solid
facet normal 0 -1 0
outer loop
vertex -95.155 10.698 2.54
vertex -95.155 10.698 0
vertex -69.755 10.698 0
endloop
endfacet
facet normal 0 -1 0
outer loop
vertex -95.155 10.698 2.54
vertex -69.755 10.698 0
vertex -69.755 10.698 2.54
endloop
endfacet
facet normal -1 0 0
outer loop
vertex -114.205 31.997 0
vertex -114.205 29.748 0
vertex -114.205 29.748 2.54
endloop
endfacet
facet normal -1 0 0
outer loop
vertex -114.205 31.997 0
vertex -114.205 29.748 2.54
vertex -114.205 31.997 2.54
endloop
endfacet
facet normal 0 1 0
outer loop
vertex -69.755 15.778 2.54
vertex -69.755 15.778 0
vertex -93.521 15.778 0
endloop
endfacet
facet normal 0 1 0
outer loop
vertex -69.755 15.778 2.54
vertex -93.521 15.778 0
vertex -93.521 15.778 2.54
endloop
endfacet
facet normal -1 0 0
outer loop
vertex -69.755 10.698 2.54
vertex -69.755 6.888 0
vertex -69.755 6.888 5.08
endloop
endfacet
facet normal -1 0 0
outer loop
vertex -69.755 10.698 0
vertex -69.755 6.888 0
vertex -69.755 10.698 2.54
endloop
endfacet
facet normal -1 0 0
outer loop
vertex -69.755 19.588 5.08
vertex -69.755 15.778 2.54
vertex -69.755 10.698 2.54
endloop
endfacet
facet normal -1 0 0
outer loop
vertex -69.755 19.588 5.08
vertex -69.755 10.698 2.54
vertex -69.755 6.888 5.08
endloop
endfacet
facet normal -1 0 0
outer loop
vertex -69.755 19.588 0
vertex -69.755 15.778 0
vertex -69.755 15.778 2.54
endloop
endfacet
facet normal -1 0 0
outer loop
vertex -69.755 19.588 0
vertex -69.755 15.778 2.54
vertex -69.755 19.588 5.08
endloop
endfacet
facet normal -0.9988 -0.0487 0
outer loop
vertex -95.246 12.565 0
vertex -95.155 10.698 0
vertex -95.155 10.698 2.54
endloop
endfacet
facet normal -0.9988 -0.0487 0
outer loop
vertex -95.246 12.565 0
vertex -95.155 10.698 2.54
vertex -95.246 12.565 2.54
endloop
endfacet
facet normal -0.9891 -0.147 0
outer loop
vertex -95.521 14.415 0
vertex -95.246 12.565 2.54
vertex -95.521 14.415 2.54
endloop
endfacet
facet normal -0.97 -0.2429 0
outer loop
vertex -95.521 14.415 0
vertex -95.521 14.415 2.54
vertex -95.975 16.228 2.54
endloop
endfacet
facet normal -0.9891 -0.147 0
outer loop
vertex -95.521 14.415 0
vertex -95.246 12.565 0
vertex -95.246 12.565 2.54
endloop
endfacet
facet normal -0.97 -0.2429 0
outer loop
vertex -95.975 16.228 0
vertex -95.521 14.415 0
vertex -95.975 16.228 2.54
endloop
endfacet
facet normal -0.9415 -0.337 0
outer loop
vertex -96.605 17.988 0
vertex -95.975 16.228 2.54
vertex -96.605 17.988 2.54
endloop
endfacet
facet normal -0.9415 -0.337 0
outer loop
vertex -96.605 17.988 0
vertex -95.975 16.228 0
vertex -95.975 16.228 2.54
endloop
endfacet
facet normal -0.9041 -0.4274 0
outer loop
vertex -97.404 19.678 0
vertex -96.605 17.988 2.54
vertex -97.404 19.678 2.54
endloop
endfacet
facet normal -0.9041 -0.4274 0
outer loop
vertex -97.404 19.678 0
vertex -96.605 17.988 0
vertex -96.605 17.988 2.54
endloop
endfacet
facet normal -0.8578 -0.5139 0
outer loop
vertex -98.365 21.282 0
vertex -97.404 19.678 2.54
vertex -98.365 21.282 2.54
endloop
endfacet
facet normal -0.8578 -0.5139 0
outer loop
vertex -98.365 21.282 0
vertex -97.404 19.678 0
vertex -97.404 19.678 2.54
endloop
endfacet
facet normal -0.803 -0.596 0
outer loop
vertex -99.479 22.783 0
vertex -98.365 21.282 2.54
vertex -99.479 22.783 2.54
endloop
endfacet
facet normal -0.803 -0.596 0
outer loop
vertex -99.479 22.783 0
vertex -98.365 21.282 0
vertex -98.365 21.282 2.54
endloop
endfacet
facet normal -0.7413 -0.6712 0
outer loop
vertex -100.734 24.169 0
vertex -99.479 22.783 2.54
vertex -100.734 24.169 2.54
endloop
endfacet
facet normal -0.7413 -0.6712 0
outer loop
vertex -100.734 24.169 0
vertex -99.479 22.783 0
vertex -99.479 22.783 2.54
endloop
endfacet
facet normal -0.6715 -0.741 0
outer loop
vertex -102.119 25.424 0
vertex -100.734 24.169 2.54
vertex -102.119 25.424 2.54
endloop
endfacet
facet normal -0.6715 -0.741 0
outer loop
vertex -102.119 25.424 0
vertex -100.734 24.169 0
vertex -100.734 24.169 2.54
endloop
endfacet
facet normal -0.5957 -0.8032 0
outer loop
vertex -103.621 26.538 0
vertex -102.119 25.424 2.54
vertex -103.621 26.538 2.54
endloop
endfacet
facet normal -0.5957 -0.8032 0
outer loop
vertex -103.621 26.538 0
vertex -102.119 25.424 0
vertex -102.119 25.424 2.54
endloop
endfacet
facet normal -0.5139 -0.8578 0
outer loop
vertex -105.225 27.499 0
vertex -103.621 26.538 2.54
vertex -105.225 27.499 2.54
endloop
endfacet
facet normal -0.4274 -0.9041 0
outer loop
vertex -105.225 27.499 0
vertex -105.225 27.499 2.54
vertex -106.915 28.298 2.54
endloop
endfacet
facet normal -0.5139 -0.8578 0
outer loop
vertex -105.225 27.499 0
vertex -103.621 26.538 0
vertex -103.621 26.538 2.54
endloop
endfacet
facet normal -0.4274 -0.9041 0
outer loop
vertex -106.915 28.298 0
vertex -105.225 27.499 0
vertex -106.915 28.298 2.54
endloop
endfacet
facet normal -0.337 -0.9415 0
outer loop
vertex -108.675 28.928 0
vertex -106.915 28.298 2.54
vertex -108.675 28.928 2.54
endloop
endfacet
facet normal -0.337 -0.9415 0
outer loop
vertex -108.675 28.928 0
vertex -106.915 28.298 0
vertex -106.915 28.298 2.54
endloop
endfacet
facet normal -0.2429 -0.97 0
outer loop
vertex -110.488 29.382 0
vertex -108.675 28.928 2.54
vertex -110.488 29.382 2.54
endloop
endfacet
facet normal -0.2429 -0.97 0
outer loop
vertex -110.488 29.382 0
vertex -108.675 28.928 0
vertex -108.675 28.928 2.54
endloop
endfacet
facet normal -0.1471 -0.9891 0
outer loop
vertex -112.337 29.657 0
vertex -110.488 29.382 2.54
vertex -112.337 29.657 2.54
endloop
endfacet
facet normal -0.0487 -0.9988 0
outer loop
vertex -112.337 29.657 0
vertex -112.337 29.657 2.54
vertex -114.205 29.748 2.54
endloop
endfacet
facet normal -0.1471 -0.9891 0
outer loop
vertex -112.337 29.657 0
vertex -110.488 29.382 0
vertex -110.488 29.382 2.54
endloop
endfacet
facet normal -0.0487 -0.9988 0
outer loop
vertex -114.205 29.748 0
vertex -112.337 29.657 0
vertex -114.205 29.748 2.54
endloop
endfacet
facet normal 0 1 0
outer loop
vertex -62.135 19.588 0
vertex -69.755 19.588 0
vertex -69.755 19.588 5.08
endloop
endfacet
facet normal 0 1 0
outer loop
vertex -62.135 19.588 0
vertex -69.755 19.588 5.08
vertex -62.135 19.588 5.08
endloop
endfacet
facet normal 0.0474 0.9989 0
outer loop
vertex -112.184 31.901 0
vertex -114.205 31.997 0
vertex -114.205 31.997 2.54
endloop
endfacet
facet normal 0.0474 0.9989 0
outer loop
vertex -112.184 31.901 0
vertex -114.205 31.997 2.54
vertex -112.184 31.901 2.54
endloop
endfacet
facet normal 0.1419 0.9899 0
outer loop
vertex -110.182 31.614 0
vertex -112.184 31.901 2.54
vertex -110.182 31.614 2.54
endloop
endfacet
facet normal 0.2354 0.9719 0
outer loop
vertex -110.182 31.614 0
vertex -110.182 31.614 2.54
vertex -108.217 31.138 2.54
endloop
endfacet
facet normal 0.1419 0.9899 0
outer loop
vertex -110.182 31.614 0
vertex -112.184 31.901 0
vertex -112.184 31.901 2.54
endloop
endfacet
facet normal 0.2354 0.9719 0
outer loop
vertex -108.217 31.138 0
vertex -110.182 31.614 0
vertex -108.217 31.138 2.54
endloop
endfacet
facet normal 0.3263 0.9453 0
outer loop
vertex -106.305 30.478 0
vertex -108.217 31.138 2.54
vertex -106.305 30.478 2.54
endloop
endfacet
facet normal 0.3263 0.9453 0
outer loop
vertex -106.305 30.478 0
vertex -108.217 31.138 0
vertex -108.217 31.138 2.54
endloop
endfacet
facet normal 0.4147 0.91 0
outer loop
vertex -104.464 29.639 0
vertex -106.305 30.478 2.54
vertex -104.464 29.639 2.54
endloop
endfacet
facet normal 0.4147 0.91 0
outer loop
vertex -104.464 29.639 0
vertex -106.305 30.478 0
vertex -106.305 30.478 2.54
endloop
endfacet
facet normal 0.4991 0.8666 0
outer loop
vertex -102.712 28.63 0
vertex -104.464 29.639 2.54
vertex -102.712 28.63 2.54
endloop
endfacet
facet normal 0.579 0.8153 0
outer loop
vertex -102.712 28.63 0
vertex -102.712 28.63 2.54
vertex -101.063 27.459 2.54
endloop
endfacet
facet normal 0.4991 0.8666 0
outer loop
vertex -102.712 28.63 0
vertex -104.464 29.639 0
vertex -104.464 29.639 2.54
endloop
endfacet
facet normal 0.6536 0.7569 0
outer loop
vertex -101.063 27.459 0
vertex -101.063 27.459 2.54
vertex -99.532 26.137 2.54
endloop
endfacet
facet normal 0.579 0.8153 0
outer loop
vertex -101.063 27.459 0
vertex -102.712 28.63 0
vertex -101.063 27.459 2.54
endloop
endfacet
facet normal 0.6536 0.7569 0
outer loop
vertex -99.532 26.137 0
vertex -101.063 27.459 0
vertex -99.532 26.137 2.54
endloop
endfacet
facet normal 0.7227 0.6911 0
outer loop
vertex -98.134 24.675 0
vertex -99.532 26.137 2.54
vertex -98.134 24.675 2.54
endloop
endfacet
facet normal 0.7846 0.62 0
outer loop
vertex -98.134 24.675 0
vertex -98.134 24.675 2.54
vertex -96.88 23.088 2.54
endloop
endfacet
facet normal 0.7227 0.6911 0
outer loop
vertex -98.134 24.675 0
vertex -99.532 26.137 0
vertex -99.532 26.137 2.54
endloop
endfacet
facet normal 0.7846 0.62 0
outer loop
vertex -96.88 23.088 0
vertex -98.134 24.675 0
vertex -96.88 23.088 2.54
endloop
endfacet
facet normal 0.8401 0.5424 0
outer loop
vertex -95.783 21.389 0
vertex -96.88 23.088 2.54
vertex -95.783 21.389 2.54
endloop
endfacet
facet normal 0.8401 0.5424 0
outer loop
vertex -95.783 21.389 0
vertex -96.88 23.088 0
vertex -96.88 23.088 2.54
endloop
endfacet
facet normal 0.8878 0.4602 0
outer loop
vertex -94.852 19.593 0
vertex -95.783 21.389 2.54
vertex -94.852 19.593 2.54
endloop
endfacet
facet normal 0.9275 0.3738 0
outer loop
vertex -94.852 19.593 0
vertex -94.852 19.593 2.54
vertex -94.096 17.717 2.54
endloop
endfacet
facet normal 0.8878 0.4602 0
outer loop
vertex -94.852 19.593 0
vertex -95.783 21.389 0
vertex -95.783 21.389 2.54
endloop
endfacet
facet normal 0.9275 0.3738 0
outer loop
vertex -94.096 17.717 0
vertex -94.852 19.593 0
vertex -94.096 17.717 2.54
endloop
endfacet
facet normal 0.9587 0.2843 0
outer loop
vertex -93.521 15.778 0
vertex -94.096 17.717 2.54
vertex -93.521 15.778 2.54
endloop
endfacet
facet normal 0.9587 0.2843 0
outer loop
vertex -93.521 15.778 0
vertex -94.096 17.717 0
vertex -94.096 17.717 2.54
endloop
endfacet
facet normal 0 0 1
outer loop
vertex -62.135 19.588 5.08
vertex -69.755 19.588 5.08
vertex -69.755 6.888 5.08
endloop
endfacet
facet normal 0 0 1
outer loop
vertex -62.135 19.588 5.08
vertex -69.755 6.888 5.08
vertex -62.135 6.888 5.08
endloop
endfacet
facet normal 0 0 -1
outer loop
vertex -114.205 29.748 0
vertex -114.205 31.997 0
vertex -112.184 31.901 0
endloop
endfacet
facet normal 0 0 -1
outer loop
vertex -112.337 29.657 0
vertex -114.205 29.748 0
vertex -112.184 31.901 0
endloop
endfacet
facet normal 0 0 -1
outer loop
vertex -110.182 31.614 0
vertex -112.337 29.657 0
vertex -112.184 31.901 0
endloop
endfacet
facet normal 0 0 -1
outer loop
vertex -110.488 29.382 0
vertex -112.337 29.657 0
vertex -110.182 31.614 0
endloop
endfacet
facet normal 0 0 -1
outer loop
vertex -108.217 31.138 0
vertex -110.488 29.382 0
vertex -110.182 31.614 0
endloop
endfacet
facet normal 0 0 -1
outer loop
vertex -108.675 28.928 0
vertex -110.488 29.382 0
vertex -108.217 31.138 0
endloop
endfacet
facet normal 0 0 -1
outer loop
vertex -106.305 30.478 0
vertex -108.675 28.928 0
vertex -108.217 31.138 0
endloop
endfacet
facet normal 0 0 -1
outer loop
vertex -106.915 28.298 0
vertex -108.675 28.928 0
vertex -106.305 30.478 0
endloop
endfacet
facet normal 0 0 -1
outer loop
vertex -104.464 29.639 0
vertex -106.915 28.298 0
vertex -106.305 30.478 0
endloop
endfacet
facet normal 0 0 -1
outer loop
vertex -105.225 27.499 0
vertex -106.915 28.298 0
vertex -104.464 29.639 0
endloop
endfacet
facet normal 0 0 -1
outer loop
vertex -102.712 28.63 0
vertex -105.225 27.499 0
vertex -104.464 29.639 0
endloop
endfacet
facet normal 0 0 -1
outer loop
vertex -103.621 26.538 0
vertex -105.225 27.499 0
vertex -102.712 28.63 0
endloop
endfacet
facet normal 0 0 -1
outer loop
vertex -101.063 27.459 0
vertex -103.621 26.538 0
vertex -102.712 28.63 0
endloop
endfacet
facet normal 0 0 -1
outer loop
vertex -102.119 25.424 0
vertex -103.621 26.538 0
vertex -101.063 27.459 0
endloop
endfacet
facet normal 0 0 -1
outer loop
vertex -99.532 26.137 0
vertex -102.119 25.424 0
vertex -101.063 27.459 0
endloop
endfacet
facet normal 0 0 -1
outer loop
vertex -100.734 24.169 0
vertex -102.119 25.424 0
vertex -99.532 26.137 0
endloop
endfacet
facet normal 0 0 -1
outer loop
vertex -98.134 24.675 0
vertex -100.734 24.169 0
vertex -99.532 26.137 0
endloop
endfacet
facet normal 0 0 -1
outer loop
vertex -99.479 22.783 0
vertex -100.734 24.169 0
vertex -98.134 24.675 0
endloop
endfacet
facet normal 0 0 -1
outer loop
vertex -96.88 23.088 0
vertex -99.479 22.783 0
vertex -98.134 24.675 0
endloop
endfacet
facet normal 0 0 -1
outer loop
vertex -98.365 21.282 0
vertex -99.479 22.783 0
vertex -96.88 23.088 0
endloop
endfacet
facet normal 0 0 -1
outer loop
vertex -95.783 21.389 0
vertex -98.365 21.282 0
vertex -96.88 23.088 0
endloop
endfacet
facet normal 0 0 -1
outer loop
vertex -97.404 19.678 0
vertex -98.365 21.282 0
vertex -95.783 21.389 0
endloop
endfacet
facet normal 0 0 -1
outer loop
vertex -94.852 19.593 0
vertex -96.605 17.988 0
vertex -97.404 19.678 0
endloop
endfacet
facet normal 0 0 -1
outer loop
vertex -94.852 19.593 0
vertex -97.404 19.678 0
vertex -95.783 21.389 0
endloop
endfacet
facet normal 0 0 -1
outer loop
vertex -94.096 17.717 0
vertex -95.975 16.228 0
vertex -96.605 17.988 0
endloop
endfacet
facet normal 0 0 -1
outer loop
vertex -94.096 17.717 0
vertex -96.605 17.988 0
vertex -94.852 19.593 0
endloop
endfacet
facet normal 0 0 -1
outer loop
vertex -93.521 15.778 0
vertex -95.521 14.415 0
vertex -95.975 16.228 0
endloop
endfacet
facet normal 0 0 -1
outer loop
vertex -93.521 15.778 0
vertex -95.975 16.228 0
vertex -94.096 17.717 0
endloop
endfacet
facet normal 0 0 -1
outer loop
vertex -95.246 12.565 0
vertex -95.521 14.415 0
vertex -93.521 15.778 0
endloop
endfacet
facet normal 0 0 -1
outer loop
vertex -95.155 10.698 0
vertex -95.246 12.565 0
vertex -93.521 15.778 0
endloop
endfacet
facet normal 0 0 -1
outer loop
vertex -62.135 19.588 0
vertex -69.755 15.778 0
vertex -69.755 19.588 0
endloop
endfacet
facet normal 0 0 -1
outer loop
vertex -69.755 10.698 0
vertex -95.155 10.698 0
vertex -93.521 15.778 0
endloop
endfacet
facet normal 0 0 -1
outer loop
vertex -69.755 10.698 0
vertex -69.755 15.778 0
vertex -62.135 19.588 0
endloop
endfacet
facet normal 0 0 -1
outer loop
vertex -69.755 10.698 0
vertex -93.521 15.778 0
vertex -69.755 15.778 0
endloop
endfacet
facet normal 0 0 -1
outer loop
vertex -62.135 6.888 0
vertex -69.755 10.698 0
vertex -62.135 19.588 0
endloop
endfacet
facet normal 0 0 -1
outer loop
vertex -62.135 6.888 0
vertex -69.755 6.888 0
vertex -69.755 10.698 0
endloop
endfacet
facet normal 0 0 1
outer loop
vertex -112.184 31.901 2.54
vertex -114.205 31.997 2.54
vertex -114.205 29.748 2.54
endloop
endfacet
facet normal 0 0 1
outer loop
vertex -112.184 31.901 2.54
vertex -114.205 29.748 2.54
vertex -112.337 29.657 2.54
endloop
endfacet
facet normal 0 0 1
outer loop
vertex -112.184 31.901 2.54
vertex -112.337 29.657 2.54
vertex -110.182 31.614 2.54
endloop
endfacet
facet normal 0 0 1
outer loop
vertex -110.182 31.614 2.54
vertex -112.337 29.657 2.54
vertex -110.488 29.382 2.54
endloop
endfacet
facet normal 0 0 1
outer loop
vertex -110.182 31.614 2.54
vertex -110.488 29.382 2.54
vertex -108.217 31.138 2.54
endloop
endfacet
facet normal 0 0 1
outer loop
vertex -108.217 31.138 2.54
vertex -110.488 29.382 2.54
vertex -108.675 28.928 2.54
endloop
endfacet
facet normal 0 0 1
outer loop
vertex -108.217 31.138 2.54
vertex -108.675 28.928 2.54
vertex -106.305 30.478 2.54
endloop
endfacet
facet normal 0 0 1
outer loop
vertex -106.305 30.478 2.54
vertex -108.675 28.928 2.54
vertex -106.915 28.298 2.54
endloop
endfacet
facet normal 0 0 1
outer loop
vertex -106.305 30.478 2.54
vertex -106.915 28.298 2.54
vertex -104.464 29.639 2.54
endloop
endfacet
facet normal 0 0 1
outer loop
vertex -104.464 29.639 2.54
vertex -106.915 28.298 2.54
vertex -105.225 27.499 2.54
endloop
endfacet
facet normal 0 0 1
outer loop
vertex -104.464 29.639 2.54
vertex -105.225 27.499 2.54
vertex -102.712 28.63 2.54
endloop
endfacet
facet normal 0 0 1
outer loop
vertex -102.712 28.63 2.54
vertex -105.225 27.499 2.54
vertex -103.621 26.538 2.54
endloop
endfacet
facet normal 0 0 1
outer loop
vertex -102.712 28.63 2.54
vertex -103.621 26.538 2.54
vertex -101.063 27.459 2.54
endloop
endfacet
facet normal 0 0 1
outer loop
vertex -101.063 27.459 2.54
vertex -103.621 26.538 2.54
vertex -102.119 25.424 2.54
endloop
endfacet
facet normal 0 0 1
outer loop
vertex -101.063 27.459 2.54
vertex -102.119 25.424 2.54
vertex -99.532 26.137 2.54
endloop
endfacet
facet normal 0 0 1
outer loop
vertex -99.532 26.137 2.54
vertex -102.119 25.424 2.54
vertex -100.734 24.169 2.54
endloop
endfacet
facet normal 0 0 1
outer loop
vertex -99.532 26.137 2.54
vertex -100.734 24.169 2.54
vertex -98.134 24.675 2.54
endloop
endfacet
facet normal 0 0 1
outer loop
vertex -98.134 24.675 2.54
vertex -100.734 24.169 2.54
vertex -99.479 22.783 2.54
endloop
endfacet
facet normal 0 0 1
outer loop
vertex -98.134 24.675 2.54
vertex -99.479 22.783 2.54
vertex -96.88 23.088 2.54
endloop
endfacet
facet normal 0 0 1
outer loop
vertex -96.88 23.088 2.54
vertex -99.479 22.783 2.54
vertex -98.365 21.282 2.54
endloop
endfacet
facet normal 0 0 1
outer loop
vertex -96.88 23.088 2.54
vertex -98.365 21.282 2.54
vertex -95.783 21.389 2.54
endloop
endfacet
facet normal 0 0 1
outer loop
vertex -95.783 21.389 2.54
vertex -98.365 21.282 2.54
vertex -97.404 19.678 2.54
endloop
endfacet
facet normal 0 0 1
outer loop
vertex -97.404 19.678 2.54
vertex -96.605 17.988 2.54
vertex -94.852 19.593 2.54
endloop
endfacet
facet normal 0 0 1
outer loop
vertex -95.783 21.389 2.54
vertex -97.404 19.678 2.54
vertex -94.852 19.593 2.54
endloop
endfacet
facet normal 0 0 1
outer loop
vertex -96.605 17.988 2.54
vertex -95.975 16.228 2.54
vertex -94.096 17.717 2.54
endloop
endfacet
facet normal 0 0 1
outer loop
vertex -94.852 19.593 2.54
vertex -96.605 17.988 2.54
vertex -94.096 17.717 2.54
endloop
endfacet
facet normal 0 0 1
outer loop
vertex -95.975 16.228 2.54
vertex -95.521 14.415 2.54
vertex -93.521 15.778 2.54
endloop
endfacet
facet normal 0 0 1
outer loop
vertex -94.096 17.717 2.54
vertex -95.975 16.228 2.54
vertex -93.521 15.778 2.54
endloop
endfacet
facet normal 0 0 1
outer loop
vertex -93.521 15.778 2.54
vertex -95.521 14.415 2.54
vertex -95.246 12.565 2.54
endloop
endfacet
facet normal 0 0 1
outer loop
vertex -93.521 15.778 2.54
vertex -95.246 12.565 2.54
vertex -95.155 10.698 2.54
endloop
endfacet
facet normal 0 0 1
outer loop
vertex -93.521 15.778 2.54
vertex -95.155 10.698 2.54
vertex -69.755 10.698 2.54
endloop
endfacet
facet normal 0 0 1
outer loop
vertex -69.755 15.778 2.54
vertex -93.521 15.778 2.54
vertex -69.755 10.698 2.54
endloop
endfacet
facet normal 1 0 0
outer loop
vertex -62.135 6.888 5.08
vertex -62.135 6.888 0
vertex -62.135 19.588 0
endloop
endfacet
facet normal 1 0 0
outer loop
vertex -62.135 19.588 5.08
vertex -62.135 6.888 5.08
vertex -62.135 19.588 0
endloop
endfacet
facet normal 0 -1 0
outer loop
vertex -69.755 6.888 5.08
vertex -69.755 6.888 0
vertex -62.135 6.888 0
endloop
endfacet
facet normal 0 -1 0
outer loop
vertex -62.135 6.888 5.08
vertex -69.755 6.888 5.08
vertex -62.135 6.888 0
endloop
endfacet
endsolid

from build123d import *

# Parameters (mm, degrees)
F0_W     = 7.62
F0_H     = 12.7
F1_DEPTH = 5.08
F2_W     = 5.08
F2_H     = 2.54
F3_DEPTH = 25.4
F5_DEPTH = 2.54


# Not quite as in the source:
# - a feature names something its author has since deleted; it is built from what else it names


with BuildPart() as f1:
    # F0 (on Top) → F1 (new body)
    with BuildSketch(Plane.XY):
        with Locations((-65.9446567297, 13.238232059)):
            Rectangle(F0_W, F0_H)
    extrude(amount=F1_DEPTH)

    # F2 (on face) → F3 (join)
    with BuildSketch(Plane(origin=(-69.7546567297, 0, 0), x_dir=(0, -1, 0), z_dir=(-1, 0, 0))):
        with Locations((-13.238232059, 1.27)):
            Rectangle(F2_W, F2_H)
    extrude(amount=F3_DEPTH)

    # F4 (on face) → F5 (join)
    with BuildSketch(Plane(origin=(0, 0, 0), x_dir=(1, 0, 0), z_dir=(0, 0, -1))):
        with BuildLine():
            Line((-93.5208049366, -15.778232059), (-95.1546567297, -15.778232059))
            Line((-95.1546567297, -15.778232059), (-95.1546567297, -10.698232059))
            ThreePointArc((-95.1546567297, -10.698232059), (-100.7342725481, -24.1686162406), (-114.2046567297, -29.748232059))
            Line((-114.2046567297, -29.748232059), (-114.2046567297, -31.9967795447))
            ThreePointArc((-114.2046567297, -31.9967795447), (-101.0625202258, -27.4586727786), (-93.5208049366, -15.778232059))
        make_face()
    extrude(amount=-F5_DEPTH)


solid = f1.part
